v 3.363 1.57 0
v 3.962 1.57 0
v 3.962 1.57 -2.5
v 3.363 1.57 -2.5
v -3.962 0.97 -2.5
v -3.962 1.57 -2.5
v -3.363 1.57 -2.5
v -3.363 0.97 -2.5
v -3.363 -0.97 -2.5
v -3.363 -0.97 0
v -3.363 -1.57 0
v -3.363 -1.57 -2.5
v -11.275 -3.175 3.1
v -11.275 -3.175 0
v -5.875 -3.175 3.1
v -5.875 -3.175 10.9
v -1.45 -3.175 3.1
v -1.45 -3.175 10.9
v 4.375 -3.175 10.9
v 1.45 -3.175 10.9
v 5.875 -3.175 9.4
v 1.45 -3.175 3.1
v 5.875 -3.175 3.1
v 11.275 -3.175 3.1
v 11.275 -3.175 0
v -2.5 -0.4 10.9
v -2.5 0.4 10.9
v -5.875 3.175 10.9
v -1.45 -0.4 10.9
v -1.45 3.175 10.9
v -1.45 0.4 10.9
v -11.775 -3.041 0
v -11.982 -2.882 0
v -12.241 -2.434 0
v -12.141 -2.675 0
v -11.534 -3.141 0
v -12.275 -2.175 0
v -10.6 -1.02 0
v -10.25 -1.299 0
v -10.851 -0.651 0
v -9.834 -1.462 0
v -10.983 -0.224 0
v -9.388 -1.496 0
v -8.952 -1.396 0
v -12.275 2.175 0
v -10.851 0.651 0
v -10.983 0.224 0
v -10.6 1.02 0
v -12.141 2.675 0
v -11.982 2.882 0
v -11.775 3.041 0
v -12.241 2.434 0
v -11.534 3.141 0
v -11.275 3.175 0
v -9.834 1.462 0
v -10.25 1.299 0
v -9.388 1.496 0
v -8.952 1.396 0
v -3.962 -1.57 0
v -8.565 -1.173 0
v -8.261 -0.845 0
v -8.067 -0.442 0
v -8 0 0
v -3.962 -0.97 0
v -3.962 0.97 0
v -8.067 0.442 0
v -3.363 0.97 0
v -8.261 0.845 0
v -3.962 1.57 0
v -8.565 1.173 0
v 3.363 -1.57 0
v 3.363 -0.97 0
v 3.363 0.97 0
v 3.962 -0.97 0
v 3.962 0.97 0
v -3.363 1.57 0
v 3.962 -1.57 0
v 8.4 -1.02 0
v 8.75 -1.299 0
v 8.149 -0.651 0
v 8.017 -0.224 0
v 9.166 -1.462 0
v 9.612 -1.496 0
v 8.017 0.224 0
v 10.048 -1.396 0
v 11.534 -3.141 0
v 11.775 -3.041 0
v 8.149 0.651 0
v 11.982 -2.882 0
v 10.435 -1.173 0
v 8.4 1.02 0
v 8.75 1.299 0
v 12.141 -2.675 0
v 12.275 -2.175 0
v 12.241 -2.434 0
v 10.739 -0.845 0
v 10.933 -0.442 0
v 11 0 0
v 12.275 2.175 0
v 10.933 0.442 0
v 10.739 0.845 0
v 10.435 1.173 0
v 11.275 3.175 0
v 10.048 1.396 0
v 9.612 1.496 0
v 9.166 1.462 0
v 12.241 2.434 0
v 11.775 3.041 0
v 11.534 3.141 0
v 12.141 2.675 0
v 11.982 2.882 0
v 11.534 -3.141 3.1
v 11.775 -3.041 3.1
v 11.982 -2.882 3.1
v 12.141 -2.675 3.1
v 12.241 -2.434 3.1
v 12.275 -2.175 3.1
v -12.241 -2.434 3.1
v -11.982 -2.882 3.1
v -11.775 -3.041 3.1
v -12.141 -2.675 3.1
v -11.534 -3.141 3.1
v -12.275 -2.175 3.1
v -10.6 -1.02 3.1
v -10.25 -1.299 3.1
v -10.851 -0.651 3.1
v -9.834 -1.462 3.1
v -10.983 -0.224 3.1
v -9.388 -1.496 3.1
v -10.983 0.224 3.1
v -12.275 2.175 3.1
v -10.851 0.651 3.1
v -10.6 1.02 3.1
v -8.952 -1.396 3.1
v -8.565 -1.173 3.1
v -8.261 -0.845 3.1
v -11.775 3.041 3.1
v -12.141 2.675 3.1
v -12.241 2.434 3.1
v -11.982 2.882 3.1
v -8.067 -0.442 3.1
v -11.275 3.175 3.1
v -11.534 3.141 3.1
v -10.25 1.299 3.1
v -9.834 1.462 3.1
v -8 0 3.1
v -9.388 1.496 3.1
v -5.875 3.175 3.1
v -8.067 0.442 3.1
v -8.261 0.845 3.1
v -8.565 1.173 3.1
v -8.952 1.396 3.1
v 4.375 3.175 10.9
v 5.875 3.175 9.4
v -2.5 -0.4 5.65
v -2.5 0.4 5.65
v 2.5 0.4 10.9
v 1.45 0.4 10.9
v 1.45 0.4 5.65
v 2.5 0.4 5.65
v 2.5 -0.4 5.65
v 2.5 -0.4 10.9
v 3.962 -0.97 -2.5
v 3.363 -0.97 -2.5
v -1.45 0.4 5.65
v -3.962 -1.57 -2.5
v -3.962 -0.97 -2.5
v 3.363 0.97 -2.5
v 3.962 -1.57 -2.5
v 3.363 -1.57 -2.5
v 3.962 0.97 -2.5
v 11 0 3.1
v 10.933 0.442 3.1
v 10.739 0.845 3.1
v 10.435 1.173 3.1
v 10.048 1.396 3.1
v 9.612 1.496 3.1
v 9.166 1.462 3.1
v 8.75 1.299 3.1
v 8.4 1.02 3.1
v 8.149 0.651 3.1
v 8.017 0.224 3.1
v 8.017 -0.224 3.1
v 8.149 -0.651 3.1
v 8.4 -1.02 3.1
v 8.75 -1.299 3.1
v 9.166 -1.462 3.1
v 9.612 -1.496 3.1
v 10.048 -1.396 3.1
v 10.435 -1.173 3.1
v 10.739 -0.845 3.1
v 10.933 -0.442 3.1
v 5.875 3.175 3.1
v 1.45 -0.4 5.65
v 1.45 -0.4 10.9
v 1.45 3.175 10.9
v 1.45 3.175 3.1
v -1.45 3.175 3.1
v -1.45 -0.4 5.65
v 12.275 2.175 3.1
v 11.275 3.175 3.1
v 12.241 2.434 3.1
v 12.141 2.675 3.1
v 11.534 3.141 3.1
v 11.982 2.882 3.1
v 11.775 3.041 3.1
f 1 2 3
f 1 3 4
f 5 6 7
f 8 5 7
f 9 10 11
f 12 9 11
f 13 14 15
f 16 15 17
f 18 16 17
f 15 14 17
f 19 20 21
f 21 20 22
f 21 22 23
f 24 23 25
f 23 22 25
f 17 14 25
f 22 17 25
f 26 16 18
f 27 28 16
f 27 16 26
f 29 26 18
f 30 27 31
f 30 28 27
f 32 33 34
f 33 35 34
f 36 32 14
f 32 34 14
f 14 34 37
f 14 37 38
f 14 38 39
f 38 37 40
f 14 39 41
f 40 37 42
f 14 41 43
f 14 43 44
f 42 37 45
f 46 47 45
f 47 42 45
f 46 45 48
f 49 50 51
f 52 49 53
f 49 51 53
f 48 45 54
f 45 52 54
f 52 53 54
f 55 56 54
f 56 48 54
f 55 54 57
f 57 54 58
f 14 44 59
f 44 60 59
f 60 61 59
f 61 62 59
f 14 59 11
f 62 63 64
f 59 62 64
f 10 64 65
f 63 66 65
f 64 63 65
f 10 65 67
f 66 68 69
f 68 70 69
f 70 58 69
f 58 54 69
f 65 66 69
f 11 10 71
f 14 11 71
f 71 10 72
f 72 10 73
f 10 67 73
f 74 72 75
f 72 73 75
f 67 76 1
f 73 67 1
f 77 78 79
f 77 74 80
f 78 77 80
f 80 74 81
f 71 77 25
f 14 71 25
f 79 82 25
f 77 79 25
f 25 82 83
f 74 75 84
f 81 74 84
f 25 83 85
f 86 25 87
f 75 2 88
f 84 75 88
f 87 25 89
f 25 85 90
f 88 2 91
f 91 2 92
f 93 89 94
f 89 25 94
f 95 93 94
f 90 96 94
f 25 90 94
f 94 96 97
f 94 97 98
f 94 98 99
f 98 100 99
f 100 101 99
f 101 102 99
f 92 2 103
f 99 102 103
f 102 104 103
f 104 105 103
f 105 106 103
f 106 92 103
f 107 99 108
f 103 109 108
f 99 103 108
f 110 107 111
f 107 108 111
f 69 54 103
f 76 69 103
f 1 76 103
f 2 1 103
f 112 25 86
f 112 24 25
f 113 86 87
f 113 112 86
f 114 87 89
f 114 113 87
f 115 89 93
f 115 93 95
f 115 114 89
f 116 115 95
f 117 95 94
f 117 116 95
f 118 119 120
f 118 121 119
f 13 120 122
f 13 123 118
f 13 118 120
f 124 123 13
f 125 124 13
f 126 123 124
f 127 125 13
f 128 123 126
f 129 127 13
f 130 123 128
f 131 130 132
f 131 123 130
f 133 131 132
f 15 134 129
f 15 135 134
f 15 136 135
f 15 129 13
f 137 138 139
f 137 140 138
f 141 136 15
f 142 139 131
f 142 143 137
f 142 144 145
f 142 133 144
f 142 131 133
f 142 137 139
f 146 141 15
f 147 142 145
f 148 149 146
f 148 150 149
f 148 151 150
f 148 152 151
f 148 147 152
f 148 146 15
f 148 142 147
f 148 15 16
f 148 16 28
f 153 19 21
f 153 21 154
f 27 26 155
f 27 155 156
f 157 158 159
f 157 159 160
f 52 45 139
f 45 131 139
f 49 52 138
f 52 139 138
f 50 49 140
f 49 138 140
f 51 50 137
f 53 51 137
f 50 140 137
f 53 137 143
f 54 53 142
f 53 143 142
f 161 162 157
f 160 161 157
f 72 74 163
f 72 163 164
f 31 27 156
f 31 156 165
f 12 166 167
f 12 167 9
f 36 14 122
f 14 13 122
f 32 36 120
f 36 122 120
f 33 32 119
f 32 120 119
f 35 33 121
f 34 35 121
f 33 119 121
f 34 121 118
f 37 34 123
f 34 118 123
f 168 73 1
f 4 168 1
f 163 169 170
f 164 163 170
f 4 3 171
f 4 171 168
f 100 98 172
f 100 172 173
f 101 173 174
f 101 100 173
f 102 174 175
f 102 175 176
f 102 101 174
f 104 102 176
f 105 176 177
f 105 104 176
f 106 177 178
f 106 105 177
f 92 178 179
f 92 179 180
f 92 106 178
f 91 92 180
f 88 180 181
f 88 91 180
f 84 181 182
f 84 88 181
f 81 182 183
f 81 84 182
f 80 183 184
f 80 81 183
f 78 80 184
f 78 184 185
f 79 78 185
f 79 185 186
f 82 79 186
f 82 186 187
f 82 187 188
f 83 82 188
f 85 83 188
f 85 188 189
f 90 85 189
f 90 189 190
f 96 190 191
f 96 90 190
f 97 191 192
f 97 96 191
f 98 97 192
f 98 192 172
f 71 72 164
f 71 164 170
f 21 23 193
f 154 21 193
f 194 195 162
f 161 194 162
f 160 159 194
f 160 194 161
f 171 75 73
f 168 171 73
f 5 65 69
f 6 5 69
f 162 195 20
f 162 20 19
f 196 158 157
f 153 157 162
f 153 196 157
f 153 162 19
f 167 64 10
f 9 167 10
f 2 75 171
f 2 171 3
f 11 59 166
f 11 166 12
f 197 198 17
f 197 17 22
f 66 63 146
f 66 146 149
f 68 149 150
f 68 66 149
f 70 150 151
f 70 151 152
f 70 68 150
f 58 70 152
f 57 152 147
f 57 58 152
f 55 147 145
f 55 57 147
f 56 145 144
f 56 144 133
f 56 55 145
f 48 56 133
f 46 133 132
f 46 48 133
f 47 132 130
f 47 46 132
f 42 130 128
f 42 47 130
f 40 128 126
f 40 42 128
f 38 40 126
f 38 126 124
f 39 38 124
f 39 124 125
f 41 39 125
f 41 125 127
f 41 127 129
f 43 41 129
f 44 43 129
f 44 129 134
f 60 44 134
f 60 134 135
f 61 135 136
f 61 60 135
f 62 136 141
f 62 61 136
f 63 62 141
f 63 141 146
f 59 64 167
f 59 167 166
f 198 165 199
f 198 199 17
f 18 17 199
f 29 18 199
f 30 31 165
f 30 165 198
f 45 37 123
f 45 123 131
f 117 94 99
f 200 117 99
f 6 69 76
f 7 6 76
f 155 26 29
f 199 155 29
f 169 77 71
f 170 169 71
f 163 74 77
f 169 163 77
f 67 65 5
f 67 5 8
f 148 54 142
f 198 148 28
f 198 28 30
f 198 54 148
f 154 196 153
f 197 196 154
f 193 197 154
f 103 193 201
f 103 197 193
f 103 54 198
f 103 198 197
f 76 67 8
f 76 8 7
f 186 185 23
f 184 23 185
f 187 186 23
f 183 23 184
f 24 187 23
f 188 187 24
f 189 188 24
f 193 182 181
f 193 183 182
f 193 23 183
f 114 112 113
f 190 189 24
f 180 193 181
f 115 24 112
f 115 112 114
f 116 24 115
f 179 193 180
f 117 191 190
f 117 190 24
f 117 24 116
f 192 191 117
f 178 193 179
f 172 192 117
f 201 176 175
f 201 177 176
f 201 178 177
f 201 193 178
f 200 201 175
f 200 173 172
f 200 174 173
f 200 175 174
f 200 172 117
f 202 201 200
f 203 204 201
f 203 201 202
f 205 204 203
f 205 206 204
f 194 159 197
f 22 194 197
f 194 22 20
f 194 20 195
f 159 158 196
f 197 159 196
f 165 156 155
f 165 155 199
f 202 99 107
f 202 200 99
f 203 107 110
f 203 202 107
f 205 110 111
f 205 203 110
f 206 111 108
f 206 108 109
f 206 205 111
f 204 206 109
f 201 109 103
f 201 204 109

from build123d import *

# Parameters (mm, degrees)
ESBO_O1_W                 = 24.55
ESBO_O1_H                 = 6.35
ESBO_O1_R                 = 1.5
RESSALTO_EXTRUS_O1_DEPTH  = 3.1
ESBO_O2_W                 = 11.75
ESBO_O2_H                 = 6.35
RESSALTO_EXTRUS_O2_DEPTH  = 7.8
ESBO_O5_W                 = 5
ESBO_O5_H                 = 0.8
CORTE_EXTRUS_O2_DEPTH     = 5.25
ESBO_O3_W                 = 2.9
ESBO_O3_H                 = 6.35
CORTE_EXTRUS_O1_DEPTH     = 7.8
CHANFRO3_SIZE             = 1.5
FILETE1_R                 = 1
ESBO_O9_W                 = 0.6
ESBO_O9_H                 = 0.6
RESSALTO_EXTRUS_O3_DEPTH  = 2.5
ESPELHAR2_COPY_1_SKETCH_W = 0.6
ESPELHAR2_COPY_1_SKETCH_H = 0.6
ESPELHAR2_COPY_1_DEPTH    = 2.5


with BuildPart() as part:
    # Esboço1 → Ressalto-extrusão1 (new body)
    with BuildSketch(Plane.XY):
        Rectangle(ESBO_O1_W, ESBO_O1_H)
        with Locations((-9.5, 0)):
            Circle(ESBO_O1_R, mode=Mode.SUBTRACT)
        with Locations((9.5, 0)):
            Circle(ESBO_O1_R, mode=Mode.SUBTRACT)
    extrude(amount=RESSALTO_EXTRUS_O1_DEPTH)

    # Esboço2 → Ressalto-extrusão2 (add)
    with BuildSketch(Plane.XY.offset(3.1)):
        Rectangle(ESBO_O2_W, ESBO_O2_H)
    extrude(amount=RESSALTO_EXTRUS_O2_DEPTH)

    # Esboço5 → Corte-extrusão2 (cut)
    with BuildSketch(Plane.XY.offset(10.9)):
        Rectangle(ESBO_O5_W, ESBO_O5_H)
    extrude(amount=-CORTE_EXTRUS_O2_DEPTH, mode=Mode.SUBTRACT)

    # Esboço3 → Corte-extrusão1 (cut)
    with BuildSketch(Plane.XY.offset(10.9)):
        Rectangle(ESBO_O3_W, ESBO_O3_H)
    extrude(amount=-CORTE_EXTRUS_O1_DEPTH, mode=Mode.SUBTRACT)

    # Chanfro3
    chanfro3_edges = [part.edges().sort_by_distance(p)[0] for p in [
        (5.875, 0, 10.9),
    ]]
    chamfer(chanfro3_edges, length=CHANFRO3_SIZE)

    # Filete1
    filete1_edges = [part.edges().sort_by_distance(p)[0] for p in [
        (12.275, -3.175, 1.55),
        (-12.275, -3.175, 1.55),
        (-12.275, 3.175, 1.55),
        (12.275, 3.175, 1.55),
    ]]
    fillet(filete1_edges, radius=FILETE1_R)

    # Esboço9 → Ressalto-extrusão3 (add)
    with BuildSketch(Plane(origin=(0, 0, 0), x_dir=(-1, 0, 0), z_dir=(0, 0, -1))):
        with Locations((-3.6625, 1.27)):
            Rectangle(ESBO_O9_W, ESBO_O9_H)
    ressalto_extrus_o3 = extrude(amount=RESSALTO_EXTRUS_O3_DEPTH)

    # Espelhar1: Ressalto-extrusão3 across plane
    add(ressalto_extrus_o3.mirror(Plane.ZX))

    # Espelhar2: Ressalto-extrusão3 across plane
    add(ressalto_extrus_o3.mirror(Plane.ZY))

    # Espelhar2 copy 1 sketch → Espelhar2 copy 1 (add)
    with BuildSketch(Plane(origin=(0, 0, 0), x_dir=(1, 0, 0), z_dir=(0, 0, -1))):
        with Locations((-3.6625, 1.27)):
            Rectangle(ESPELHAR2_COPY_1_SKETCH_W, ESPELHAR2_COPY_1_SKETCH_H)
    extrude(amount=ESPELHAR2_COPY_1_DEPTH)


solid = part.part
